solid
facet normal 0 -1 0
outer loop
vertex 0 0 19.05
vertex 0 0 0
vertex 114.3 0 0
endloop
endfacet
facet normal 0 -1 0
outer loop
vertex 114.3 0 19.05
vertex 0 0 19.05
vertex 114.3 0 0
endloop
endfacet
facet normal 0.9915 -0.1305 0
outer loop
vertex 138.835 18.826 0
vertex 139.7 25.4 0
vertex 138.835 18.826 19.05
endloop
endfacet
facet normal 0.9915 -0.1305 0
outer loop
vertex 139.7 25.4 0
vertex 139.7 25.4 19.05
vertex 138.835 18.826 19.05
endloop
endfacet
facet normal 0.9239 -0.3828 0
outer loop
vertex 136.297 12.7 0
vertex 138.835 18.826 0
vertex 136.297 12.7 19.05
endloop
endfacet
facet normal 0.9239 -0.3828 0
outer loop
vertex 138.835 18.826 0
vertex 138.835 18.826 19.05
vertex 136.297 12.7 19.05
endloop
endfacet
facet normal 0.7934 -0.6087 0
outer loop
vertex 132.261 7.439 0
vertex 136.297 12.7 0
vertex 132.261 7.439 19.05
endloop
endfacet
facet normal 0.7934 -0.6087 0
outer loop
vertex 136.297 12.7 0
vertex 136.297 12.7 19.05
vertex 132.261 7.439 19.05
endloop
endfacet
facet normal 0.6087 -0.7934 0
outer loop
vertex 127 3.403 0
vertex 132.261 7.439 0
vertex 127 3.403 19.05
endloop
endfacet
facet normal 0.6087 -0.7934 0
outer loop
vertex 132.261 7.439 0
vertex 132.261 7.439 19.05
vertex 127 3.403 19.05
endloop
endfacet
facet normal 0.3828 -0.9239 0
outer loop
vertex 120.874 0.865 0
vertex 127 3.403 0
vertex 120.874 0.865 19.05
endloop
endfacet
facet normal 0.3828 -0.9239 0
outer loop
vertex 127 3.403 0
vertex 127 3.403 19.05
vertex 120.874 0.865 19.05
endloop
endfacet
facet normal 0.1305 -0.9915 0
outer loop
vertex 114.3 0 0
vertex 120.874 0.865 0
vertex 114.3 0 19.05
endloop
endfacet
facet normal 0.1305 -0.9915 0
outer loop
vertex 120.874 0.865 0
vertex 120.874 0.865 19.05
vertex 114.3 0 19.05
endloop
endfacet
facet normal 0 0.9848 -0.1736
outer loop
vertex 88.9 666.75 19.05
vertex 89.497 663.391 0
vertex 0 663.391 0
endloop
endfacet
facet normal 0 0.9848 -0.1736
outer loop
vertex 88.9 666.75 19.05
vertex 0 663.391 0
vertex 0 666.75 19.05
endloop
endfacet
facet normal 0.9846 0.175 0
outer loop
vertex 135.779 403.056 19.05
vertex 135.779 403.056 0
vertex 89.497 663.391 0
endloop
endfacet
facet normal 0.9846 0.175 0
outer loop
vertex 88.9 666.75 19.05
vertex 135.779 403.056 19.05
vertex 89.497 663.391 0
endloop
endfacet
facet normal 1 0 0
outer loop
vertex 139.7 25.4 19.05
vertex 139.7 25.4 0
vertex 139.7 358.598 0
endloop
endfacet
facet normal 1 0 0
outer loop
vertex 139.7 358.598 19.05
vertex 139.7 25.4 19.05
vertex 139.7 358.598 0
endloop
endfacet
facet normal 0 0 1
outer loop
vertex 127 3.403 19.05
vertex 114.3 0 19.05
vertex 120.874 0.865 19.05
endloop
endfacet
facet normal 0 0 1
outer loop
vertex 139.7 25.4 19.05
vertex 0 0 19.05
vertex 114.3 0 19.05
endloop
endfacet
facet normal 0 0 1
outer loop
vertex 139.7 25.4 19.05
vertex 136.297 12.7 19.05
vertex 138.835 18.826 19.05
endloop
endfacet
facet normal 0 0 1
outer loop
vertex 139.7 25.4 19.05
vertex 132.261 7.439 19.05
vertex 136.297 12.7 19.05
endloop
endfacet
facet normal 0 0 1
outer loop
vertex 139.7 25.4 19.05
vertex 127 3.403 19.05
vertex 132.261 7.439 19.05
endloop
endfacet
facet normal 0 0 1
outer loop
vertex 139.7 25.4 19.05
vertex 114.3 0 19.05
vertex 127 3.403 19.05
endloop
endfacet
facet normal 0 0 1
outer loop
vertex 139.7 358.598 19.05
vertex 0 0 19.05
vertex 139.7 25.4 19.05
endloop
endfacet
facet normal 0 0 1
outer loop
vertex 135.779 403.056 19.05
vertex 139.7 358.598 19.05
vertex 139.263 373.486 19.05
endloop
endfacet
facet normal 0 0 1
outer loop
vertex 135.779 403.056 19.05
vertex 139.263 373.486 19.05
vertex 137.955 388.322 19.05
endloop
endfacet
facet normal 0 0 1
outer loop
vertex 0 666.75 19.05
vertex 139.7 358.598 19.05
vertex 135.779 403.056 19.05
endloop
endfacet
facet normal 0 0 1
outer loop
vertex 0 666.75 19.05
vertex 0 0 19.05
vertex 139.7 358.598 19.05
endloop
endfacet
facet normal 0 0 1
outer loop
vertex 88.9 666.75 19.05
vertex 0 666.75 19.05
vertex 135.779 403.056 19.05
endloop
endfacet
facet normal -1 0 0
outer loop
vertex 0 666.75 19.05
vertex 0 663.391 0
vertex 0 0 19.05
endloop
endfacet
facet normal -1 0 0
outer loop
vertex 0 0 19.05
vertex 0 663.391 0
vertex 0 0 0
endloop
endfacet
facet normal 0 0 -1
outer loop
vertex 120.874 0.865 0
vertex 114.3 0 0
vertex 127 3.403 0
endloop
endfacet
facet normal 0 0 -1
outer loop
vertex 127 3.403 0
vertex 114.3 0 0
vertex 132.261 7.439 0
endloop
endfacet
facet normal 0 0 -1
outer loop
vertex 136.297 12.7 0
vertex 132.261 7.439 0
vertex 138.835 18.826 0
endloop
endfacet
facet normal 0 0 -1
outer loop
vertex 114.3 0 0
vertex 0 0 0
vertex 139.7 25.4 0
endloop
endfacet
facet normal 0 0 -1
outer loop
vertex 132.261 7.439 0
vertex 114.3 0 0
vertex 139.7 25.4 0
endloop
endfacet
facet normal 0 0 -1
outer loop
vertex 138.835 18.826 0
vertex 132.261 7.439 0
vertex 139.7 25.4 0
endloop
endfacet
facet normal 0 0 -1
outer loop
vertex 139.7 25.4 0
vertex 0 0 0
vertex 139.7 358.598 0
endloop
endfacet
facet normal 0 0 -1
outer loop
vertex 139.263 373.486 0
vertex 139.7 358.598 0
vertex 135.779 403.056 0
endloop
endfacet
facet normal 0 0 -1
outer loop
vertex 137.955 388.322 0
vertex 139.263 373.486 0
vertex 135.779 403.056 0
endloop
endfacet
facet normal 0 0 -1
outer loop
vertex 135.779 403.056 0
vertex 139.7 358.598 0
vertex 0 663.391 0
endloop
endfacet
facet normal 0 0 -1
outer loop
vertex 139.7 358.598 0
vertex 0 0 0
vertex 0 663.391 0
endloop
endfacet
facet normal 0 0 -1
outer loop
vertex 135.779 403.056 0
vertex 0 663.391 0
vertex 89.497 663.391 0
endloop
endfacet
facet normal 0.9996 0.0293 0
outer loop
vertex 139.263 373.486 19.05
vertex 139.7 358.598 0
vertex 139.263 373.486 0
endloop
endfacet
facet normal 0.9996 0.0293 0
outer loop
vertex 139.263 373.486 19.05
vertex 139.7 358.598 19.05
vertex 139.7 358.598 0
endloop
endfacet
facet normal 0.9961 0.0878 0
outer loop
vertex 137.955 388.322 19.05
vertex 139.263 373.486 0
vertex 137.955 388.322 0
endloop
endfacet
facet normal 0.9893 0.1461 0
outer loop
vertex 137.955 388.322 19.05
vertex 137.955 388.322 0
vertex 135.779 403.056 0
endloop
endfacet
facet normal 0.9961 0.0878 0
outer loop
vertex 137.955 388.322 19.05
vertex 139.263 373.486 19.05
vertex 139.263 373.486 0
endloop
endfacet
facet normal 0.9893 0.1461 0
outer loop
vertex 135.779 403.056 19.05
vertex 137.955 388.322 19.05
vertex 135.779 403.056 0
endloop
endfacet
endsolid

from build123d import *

# Parameters (mm, degrees)
F1_DEPTH = 19.05
F2_R     = 254
F3_R     = 25.4
F5_DEPTH = 139.701


with BuildPart() as f1:
    # F0 (on Top) → F1 (new body)
    with BuildSketch(Plane.XY):
        Polygon((0, 666.75), (0, 0), (139.7, 0), (139.7, 381), (88.9, 666.75), align=None)
    extrude(amount=F1_DEPTH)

    # F2
    f2_edges = [f1.edges().sort_by_distance(p)[0] for p in [
        (139.7, 381, 9.525),
    ]]
    fillet(f2_edges, radius=F2_R)

    # F3
    f3_edges = [f1.edges().sort_by_distance(p)[0] for p in [
        (139.7, 0, 9.525),
    ]]
    fillet(f3_edges, radius=F3_R)

    # F4 (on face) → F5 (cut, through all)
    with BuildSketch(Plane(origin=(0, 0, 0), x_dir=(0, -1, 0), z_dir=(-1, 0, 0))):
        Polygon((-663.390971, 0), (-666.75, 19.05), (-666.75, 0), align=None)
    extrude(amount=-F5_DEPTH, mode=Mode.SUBTRACT)


solid = f1.part
